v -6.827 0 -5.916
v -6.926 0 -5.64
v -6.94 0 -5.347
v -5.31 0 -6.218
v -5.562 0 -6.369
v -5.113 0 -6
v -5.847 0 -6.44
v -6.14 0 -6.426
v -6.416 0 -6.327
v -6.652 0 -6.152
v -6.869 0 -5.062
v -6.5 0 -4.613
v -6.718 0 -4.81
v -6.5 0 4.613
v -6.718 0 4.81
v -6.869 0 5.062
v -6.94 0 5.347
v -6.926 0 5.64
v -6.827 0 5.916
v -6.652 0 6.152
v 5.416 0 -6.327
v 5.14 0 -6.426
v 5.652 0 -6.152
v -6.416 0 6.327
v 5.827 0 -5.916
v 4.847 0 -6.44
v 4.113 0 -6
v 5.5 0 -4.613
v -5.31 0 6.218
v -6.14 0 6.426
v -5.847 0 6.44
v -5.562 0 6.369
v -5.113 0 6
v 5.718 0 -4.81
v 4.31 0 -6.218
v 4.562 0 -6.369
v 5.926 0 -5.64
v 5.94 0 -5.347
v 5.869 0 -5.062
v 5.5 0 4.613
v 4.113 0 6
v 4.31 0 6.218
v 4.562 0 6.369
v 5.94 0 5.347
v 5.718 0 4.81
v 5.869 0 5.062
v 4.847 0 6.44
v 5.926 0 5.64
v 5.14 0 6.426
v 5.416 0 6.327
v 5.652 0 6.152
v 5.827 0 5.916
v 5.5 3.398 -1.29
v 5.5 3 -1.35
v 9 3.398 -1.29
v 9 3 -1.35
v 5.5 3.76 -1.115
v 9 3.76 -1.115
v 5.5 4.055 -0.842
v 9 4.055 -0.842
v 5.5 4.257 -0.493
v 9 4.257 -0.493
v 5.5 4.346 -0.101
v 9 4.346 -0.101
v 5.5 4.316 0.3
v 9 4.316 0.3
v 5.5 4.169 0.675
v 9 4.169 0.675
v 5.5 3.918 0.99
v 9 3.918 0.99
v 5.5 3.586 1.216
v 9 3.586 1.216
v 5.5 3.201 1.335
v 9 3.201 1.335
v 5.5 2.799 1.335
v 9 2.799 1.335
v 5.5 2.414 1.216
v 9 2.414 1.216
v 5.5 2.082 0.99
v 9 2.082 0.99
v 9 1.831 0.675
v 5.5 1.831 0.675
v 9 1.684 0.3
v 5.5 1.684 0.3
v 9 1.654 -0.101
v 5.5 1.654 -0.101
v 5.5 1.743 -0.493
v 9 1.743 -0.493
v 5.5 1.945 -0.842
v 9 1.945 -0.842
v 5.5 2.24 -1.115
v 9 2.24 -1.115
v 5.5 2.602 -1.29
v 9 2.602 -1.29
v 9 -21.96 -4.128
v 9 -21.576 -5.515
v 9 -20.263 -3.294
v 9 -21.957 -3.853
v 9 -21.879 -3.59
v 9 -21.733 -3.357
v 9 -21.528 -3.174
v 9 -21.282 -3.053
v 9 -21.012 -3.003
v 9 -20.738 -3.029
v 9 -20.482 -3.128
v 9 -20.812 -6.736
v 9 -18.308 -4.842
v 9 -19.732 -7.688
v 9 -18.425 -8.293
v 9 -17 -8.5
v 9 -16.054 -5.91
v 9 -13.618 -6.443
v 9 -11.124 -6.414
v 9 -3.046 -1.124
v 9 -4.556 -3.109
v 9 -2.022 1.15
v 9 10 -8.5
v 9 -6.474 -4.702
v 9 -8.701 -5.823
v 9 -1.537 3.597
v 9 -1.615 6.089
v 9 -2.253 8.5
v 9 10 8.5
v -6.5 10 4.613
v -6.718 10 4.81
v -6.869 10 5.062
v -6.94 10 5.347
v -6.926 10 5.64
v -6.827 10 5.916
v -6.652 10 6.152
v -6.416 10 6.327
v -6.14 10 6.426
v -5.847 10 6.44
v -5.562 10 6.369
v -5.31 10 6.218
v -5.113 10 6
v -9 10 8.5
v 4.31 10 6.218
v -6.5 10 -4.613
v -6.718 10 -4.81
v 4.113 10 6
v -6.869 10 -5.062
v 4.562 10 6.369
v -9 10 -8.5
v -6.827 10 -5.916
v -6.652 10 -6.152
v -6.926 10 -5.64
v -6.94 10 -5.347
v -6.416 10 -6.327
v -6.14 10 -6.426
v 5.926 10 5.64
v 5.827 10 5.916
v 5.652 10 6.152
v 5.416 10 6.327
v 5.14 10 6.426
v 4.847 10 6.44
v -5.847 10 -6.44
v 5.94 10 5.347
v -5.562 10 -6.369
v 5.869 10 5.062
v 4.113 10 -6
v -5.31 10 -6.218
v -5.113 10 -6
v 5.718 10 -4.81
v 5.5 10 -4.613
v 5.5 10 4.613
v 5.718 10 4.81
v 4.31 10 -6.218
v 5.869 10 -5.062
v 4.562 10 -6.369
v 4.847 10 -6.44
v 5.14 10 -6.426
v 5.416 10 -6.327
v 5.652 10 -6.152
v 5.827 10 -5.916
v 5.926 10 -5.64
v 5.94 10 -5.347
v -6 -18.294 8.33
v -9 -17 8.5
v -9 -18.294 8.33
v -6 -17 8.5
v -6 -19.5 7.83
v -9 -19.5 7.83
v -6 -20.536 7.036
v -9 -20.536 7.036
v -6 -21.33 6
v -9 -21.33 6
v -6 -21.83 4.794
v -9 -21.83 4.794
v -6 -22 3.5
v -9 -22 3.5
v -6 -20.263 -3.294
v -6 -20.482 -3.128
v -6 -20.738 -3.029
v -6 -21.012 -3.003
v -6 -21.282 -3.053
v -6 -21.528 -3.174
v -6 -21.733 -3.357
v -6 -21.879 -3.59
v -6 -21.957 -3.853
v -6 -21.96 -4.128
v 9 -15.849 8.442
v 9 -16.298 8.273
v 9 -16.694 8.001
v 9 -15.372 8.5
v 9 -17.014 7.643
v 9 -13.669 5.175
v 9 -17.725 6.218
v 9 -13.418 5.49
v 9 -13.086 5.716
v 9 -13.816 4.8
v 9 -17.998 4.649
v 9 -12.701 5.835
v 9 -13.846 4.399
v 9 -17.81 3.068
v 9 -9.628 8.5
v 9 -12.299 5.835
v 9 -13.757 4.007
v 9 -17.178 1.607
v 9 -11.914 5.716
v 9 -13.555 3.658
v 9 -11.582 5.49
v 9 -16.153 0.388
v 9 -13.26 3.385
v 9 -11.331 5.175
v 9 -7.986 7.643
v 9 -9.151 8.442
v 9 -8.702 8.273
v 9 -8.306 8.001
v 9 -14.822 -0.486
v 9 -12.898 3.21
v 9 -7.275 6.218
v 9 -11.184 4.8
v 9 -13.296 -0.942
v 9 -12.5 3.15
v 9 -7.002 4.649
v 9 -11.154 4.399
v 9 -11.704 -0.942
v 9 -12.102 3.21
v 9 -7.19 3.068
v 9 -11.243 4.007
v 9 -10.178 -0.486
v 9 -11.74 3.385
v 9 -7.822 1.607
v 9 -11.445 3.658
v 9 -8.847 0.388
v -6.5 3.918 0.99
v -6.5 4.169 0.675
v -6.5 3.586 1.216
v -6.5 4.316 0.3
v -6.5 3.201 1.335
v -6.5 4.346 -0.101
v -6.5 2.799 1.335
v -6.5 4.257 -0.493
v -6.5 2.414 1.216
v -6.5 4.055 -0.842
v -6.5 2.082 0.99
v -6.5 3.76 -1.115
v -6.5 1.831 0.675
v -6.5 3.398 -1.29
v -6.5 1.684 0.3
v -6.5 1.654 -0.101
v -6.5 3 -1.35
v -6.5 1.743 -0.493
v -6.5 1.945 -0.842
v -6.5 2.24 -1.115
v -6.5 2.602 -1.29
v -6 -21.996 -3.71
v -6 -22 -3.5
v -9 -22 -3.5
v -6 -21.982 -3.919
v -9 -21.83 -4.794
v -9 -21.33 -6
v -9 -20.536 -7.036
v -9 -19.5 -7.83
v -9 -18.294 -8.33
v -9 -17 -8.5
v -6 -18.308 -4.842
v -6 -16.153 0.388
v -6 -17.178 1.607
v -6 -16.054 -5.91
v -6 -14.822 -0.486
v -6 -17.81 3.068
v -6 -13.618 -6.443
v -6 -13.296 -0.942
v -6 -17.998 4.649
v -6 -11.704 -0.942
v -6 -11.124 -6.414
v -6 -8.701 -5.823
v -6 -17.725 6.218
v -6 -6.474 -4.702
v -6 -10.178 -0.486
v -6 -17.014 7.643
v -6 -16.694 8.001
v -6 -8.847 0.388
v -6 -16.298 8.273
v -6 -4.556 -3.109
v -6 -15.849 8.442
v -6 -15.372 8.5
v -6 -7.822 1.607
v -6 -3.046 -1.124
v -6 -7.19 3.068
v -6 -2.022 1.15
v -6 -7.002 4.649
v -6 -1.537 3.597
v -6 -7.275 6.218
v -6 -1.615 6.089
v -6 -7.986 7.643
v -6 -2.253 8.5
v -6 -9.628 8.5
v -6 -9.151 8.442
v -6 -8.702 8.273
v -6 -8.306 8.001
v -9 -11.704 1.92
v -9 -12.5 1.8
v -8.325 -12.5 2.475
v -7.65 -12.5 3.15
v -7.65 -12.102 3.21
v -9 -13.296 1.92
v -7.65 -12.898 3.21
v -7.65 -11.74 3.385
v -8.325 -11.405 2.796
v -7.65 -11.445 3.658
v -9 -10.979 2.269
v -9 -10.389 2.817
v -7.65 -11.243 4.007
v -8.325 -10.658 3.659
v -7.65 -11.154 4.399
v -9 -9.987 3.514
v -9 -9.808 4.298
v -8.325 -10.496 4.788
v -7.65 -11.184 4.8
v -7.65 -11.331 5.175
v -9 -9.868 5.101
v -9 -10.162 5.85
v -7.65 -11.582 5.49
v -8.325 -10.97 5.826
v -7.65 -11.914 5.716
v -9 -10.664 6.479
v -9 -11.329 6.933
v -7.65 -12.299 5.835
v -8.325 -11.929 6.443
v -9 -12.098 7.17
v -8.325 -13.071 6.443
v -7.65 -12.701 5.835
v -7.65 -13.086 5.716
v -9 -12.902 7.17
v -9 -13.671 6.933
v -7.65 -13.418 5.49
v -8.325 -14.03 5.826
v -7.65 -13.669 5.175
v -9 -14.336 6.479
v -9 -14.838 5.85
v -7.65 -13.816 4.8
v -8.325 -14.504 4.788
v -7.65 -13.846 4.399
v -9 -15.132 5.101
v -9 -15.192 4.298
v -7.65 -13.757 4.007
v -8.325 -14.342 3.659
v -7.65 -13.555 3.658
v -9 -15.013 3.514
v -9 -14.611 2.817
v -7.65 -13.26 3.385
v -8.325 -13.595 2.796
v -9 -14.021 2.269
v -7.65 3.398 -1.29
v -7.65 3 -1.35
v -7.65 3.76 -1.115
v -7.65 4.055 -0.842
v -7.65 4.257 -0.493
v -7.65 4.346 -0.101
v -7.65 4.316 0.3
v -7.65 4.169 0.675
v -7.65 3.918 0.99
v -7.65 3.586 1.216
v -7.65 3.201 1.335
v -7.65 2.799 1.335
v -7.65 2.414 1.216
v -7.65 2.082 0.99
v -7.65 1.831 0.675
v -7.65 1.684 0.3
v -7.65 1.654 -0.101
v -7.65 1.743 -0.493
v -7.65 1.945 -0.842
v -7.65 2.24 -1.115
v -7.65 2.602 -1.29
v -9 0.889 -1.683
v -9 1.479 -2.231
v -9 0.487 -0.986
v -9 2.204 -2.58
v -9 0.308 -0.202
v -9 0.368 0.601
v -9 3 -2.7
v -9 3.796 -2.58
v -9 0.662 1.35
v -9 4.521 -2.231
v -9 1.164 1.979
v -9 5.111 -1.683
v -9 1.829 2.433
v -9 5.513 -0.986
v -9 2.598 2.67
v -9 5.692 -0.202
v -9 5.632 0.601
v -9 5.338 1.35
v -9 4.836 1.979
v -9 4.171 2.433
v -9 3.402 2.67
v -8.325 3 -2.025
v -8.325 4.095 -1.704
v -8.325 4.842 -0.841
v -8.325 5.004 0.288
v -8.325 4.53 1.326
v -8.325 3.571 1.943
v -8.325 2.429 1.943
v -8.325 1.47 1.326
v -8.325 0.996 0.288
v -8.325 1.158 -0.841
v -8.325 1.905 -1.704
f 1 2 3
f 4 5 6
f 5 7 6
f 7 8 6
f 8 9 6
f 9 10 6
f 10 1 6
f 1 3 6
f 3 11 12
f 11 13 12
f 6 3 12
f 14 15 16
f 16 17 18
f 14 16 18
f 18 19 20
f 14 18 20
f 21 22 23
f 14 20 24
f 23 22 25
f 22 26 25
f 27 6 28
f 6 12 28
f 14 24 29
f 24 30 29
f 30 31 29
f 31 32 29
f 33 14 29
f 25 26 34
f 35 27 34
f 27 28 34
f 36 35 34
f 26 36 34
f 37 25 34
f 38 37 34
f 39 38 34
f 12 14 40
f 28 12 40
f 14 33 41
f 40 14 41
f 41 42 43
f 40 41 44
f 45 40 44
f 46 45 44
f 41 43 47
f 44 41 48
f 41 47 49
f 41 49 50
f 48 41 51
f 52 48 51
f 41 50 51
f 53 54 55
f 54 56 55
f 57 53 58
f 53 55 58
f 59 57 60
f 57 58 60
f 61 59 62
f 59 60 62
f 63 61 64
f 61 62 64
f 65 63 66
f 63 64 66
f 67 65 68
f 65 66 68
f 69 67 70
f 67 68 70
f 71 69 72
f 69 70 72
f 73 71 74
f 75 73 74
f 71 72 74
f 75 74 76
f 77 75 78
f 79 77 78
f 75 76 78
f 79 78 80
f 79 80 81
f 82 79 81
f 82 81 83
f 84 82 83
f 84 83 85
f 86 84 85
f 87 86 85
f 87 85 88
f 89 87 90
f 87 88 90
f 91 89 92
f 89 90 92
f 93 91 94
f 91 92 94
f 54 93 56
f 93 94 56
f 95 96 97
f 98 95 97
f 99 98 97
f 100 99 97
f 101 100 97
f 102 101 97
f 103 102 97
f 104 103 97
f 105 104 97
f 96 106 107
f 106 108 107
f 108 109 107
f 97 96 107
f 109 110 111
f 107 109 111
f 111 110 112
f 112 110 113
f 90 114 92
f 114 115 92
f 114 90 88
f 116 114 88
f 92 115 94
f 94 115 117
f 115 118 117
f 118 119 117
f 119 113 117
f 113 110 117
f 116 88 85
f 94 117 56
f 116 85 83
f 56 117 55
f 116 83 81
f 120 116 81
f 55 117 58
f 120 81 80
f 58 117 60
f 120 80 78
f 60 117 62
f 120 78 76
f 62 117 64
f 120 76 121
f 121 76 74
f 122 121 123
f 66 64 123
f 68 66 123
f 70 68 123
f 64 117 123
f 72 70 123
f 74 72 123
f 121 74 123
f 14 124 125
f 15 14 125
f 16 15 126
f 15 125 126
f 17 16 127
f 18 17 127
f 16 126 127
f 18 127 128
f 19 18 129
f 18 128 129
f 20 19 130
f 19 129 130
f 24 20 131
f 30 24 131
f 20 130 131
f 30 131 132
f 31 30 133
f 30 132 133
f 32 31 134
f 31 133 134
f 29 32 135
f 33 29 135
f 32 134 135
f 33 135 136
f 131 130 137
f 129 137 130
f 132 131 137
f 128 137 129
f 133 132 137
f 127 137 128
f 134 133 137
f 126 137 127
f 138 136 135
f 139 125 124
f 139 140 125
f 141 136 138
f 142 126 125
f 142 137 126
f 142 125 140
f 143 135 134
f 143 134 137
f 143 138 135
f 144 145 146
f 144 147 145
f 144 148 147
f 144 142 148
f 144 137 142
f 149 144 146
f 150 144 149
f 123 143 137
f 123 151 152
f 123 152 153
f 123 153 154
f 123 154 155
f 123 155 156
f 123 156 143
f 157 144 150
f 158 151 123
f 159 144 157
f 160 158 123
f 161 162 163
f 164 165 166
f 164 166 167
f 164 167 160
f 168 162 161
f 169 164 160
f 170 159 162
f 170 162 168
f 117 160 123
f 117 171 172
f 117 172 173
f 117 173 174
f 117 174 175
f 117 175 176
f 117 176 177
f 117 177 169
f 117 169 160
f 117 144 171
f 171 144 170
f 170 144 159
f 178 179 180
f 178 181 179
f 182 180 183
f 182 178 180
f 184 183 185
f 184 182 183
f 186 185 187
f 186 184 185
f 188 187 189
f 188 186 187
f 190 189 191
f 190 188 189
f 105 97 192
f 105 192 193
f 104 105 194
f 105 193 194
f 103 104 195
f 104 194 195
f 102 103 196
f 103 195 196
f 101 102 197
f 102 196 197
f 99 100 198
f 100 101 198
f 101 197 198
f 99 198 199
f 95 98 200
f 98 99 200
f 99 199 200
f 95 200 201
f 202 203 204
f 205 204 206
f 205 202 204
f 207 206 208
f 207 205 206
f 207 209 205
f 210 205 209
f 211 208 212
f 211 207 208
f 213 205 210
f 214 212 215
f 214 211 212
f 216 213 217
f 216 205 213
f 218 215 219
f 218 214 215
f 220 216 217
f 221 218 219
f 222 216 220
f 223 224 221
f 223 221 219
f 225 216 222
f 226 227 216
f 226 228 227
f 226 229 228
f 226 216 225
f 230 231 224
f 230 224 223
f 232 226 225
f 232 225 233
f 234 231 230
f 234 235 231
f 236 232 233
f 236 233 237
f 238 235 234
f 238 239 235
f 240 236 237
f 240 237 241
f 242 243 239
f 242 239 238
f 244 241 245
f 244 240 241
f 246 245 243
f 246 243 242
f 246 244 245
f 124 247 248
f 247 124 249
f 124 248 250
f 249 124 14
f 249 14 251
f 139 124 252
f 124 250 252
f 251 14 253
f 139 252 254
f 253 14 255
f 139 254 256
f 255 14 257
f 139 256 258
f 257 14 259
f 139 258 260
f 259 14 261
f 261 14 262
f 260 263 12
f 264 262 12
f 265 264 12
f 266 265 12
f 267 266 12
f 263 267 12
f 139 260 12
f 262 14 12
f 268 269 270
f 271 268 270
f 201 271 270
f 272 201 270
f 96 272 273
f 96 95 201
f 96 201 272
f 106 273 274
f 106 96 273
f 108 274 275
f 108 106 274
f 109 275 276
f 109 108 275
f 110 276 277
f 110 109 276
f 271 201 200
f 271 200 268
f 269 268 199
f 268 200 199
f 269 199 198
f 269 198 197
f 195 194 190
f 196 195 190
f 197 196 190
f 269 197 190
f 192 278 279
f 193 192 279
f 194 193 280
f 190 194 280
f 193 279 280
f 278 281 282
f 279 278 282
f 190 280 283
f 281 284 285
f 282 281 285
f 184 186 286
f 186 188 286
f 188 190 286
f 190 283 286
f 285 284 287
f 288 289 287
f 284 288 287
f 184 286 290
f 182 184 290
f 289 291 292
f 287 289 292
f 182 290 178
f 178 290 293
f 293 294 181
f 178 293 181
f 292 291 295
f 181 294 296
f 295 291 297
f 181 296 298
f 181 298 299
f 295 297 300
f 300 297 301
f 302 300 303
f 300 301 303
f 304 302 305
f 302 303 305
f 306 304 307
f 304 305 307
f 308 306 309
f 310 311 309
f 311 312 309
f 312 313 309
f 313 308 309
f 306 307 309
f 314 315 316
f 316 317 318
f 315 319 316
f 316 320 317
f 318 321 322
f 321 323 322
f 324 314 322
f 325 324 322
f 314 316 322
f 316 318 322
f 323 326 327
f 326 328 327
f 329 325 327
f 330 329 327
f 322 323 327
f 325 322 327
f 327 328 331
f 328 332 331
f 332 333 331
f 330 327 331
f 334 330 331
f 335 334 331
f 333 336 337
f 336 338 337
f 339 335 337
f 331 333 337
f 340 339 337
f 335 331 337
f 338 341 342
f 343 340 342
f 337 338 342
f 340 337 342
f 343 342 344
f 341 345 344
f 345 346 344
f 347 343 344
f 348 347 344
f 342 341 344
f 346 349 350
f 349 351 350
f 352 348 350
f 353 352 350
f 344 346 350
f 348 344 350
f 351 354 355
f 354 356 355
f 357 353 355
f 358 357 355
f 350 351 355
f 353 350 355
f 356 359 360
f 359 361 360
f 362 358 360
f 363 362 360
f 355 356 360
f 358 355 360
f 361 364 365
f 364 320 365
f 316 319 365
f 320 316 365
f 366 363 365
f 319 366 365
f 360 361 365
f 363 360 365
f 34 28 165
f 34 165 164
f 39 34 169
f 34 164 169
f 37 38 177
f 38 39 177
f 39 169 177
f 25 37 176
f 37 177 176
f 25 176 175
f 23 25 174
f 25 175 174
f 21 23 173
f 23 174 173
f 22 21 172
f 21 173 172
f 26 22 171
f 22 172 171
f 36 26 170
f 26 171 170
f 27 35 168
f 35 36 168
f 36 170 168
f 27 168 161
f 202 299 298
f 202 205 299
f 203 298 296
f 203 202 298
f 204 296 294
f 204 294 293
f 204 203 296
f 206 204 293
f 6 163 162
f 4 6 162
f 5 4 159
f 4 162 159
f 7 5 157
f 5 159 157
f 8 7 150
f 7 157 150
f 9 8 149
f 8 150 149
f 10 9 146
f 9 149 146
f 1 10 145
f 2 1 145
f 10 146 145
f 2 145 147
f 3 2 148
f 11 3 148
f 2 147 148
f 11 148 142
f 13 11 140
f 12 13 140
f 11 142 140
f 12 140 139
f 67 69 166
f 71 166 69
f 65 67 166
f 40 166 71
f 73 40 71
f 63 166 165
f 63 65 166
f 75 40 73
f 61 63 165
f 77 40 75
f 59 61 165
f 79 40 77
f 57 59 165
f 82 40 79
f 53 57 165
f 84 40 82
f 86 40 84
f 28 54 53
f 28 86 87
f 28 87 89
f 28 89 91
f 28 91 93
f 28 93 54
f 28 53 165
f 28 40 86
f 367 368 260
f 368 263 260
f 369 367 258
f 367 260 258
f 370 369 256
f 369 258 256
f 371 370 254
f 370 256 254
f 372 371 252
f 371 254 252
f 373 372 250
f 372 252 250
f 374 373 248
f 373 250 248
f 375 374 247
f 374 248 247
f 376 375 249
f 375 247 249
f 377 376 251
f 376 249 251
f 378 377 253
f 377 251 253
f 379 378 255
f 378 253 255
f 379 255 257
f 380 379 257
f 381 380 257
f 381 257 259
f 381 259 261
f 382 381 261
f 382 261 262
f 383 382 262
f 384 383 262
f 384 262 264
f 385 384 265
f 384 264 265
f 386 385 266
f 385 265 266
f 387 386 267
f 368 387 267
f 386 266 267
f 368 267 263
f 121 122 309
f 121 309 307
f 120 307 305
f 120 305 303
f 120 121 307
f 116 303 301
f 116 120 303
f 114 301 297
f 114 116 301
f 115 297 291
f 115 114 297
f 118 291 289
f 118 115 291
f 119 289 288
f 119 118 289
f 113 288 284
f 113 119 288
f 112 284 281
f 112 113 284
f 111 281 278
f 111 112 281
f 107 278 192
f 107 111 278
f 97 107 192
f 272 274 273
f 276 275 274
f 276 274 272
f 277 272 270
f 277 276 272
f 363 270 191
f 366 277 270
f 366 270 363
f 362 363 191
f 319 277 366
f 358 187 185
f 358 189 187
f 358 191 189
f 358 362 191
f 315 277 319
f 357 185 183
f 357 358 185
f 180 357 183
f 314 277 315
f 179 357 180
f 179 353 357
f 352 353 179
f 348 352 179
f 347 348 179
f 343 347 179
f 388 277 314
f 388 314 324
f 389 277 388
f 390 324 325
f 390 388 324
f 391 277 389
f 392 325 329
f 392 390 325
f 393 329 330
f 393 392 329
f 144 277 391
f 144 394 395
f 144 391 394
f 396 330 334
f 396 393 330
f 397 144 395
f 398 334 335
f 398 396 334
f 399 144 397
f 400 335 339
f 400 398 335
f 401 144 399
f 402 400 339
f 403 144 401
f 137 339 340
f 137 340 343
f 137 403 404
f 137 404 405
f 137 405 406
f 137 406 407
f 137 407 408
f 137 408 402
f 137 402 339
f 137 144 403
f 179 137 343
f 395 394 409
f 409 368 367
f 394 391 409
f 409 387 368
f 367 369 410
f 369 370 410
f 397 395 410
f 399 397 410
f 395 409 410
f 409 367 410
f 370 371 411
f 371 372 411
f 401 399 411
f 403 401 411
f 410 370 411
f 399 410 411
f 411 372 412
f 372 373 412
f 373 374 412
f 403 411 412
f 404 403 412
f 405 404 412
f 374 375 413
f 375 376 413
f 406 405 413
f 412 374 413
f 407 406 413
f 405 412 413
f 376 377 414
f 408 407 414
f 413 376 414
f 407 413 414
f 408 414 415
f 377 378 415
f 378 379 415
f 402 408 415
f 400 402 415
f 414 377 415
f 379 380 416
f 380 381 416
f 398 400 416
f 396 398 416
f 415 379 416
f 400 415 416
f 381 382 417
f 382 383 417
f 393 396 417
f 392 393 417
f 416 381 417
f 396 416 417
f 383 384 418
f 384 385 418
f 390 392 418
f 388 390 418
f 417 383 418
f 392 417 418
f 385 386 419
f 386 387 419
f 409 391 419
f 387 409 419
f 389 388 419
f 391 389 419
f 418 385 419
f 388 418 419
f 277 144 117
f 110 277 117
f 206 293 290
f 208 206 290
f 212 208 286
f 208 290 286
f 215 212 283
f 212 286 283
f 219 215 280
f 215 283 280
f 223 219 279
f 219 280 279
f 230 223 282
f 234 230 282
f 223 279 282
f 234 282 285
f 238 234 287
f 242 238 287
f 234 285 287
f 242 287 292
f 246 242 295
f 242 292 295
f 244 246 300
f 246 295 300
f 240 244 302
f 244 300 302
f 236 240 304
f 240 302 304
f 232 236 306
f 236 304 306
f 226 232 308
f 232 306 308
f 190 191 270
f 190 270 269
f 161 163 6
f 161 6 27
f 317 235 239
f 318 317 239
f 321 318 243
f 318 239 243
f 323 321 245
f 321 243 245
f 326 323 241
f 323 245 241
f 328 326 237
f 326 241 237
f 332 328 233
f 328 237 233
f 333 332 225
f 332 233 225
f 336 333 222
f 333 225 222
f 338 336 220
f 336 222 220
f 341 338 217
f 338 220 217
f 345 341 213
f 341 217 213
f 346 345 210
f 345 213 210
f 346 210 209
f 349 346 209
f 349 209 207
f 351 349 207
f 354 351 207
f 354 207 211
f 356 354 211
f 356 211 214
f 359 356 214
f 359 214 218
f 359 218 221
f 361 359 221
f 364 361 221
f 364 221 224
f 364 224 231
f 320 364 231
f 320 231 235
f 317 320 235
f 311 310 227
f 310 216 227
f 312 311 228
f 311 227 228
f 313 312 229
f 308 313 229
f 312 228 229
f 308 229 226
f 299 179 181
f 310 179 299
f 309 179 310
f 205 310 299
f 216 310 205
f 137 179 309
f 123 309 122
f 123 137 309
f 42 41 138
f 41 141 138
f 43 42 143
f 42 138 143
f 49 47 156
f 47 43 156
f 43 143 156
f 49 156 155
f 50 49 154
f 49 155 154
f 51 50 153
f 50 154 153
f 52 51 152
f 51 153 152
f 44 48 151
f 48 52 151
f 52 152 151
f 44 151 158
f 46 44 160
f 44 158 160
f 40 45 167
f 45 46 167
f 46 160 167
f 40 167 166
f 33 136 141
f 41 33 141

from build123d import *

# Parameters (mm, degrees)
SKETCH_1_W                = 18
SKETCH_1_H                = 17
SKETCH_1_W_2              = 12
SKETCH_1_H_2              = 12
EXTRUDE_1_DEPTH           = 10
SKETCH_4_W                = 18
SKETCH_4_H                = 17
EXTRUDE_2_DEPTH           = 22
SKETCH_5_R                = 11
CUT_EXTRUDE_1_DEPTH       = 15
SKETCH_8_R                = 1.25
EXTRUDE_3_DEPTH           = 15
SKETCH_13_R               = 1.25
CUT_EXTRUDE_5_DEPTH       = 30.669007398
SKETCH_9_R                = 1.35
CUT_EXTRUDE_3_DEPTH       = 30.669007398
FILLET_4_R                = 5
SKETCH_20_R               = 1
CUT_EXTRUDE_7_DEPTH       = 10
FILLET_5_R                = 5
FILLET_6_R                = 2
FILLET_7_R                = 1
HOLE_WIZARD_1_D           = 2.7
HOLE_WIZARD_1_CSINK_D     = 5.4
HOLE_WIZARD_1_CSINK_ANGLE = 90


with BuildPart() as part:
    # 草图1 → 凸台-拉伸1 (new body)
    with BuildSketch(Plane(origin=(0, 0, 0), x_dir=(1, 0, 0), z_dir=(0, 1, 0))):
        Rectangle(SKETCH_1_W, SKETCH_1_H)
        with Locations((-0.5, 0)):
            Rectangle(SKETCH_1_W_2, SKETCH_1_H_2, mode=Mode.SUBTRACT)
    extrude(amount=EXTRUDE_1_DEPTH)

    # 草图4 → 凸台-拉伸2 (add)
    with BuildSketch(Plane.XZ):
        Rectangle(SKETCH_4_W, SKETCH_4_H)
    extrude(amount=EXTRUDE_2_DEPTH)

    # 草图5 → 切除-拉伸1 (cut)
    with BuildSketch(Plane.ZY.offset(-9)):
        with Locations((4.5, -12.5)):
            Circle(SKETCH_5_R)
    extrude(amount=CUT_EXTRUDE_1_DEPTH, mode=Mode.SUBTRACT)

    # 草图8 → 凸台-拉伸3 (add)
    with BuildSketch(Plane(origin=(-6, 0, 0), x_dir=(0, 0, -1), z_dir=(1, 0, 0))):
        with BuildLine():
            Line((-8.5, -8.725082782), (-8.5, -16.274917218))
            ThreePointArc((-8.5, -16.274917218), (1, -12.5), (-8.5, -8.725082782))
        make_face()
        with Locations(Location((-4.5, -12.5, 0), (0, 0, 180))):
            Circle(SKETCH_8_R, mode=Mode.SUBTRACT)
    extrude(amount=EXTRUDE_3_DEPTH)

    # 草图13 → 切除-拉伸5 (cut, through all)
    with BuildSketch(Plane(origin=(9, 0, 0), x_dir=(0, 0, -1), z_dir=(1, 0, 0))):
        with Locations((0, 3)):
            Circle(SKETCH_13_R)
    extrude(amount=-CUT_EXTRUDE_5_DEPTH, mode=Mode.SUBTRACT)

    # 草图9 → 切除-拉伸3 (cut, through all)
    with BuildSketch(Plane(origin=(9, 0, 0), x_dir=(0, 0, -1), z_dir=(1, 0, 0))):
        with Locations((-4.5, -12.5)):
            Circle(SKETCH_9_R)
    extrude(amount=-CUT_EXTRUDE_3_DEPTH, mode=Mode.SUBTRACT)

    # 圆角4
    fillet_4_edges = [part.edges().sort_by_distance(p)[0] for p in [
        (0, -22, -8.5),
    ]]
    fillet(fillet_4_edges, radius=FILLET_4_R)

    # 草图20 → 切除-拉伸7 (cut)
    with BuildSketch(Plane(origin=(0, 10, 0), x_dir=(1, 0, 0), z_dir=(0, 1, 0))):
        with Locations((4.944722215, -5.444722215)):
            Circle(SKETCH_20_R)
        with Locations((4.944722215, 5.444722215)):
            Circle(SKETCH_20_R)
        with Locations((-5.944722215, 5.444722215)):
            Circle(SKETCH_20_R)
        with Locations((-5.944722215, -5.444722215)):
            Circle(SKETCH_20_R)
    extrude(amount=-CUT_EXTRUDE_7_DEPTH, mode=Mode.SUBTRACT)

    # 圆角5
    fillet_5_edges = [part.edges().sort_by_distance(p)[0] for p in [
        (-7.5, -22, 8.5),
    ]]
    fillet(fillet_5_edges, radius=FILLET_5_R)

    # 圆角6
    fillet_6_edges = [part.edges().sort_by_distance(p)[0] for p in [
        (1.5, -16.274917218, 8.5),
        (1.5, -8.725082782, 8.5),
    ]]
    fillet(fillet_6_edges, radius=FILLET_6_R)

    # 圆角7
    # the kernel refuses this fillet: 1 mm, written as the material it takes off along each edge
    with BuildSketch(Plane(origin=(-6, -22, -1.045268253), x_dir=(0, 0.6114361728106764, -0.7912937549220469), z_dir=(1, 0, 0))) as fillet_7_piece_1:
        with BuildLine():
            CenterArc((2.970570235, -0.991624388), FILLET_7_R, 97.420778889, 142.097986779)
            Line((2.463314102, -1.853419733), (2.412588489, -1.939599267))
            ThreePointArc((2.412588489, -1.939599267), (1.881270284, -1.58004116), (-0.061143617, -0.079129375))
            Line((-0.061143617, -0.079129375), (0.012915523, 0.099162439))
            ThreePointArc((0.012915523, 0.099162439), (1.420707504, 0.00786827), (2.828499484, 0.099162439))
            Line((2.828499484, 0.099162439), (2.841415007, 0))
        make_face()
    extrude(amount=22.706766942, mode=Mode.SUBTRACT)

    # 打孔尺寸(%根据十字)槽沉头木螺钉的类型1 (through all)
    with Locations(Plane.ZY.offset(9)):
        with Locations((4.5, -12.5), (0, 3)):
            CounterSinkHole(HOLE_WIZARD_1_D / 2, HOLE_WIZARD_1_CSINK_D / 2, counter_sink_angle=HOLE_WIZARD_1_CSINK_ANGLE)


solid = part.part
